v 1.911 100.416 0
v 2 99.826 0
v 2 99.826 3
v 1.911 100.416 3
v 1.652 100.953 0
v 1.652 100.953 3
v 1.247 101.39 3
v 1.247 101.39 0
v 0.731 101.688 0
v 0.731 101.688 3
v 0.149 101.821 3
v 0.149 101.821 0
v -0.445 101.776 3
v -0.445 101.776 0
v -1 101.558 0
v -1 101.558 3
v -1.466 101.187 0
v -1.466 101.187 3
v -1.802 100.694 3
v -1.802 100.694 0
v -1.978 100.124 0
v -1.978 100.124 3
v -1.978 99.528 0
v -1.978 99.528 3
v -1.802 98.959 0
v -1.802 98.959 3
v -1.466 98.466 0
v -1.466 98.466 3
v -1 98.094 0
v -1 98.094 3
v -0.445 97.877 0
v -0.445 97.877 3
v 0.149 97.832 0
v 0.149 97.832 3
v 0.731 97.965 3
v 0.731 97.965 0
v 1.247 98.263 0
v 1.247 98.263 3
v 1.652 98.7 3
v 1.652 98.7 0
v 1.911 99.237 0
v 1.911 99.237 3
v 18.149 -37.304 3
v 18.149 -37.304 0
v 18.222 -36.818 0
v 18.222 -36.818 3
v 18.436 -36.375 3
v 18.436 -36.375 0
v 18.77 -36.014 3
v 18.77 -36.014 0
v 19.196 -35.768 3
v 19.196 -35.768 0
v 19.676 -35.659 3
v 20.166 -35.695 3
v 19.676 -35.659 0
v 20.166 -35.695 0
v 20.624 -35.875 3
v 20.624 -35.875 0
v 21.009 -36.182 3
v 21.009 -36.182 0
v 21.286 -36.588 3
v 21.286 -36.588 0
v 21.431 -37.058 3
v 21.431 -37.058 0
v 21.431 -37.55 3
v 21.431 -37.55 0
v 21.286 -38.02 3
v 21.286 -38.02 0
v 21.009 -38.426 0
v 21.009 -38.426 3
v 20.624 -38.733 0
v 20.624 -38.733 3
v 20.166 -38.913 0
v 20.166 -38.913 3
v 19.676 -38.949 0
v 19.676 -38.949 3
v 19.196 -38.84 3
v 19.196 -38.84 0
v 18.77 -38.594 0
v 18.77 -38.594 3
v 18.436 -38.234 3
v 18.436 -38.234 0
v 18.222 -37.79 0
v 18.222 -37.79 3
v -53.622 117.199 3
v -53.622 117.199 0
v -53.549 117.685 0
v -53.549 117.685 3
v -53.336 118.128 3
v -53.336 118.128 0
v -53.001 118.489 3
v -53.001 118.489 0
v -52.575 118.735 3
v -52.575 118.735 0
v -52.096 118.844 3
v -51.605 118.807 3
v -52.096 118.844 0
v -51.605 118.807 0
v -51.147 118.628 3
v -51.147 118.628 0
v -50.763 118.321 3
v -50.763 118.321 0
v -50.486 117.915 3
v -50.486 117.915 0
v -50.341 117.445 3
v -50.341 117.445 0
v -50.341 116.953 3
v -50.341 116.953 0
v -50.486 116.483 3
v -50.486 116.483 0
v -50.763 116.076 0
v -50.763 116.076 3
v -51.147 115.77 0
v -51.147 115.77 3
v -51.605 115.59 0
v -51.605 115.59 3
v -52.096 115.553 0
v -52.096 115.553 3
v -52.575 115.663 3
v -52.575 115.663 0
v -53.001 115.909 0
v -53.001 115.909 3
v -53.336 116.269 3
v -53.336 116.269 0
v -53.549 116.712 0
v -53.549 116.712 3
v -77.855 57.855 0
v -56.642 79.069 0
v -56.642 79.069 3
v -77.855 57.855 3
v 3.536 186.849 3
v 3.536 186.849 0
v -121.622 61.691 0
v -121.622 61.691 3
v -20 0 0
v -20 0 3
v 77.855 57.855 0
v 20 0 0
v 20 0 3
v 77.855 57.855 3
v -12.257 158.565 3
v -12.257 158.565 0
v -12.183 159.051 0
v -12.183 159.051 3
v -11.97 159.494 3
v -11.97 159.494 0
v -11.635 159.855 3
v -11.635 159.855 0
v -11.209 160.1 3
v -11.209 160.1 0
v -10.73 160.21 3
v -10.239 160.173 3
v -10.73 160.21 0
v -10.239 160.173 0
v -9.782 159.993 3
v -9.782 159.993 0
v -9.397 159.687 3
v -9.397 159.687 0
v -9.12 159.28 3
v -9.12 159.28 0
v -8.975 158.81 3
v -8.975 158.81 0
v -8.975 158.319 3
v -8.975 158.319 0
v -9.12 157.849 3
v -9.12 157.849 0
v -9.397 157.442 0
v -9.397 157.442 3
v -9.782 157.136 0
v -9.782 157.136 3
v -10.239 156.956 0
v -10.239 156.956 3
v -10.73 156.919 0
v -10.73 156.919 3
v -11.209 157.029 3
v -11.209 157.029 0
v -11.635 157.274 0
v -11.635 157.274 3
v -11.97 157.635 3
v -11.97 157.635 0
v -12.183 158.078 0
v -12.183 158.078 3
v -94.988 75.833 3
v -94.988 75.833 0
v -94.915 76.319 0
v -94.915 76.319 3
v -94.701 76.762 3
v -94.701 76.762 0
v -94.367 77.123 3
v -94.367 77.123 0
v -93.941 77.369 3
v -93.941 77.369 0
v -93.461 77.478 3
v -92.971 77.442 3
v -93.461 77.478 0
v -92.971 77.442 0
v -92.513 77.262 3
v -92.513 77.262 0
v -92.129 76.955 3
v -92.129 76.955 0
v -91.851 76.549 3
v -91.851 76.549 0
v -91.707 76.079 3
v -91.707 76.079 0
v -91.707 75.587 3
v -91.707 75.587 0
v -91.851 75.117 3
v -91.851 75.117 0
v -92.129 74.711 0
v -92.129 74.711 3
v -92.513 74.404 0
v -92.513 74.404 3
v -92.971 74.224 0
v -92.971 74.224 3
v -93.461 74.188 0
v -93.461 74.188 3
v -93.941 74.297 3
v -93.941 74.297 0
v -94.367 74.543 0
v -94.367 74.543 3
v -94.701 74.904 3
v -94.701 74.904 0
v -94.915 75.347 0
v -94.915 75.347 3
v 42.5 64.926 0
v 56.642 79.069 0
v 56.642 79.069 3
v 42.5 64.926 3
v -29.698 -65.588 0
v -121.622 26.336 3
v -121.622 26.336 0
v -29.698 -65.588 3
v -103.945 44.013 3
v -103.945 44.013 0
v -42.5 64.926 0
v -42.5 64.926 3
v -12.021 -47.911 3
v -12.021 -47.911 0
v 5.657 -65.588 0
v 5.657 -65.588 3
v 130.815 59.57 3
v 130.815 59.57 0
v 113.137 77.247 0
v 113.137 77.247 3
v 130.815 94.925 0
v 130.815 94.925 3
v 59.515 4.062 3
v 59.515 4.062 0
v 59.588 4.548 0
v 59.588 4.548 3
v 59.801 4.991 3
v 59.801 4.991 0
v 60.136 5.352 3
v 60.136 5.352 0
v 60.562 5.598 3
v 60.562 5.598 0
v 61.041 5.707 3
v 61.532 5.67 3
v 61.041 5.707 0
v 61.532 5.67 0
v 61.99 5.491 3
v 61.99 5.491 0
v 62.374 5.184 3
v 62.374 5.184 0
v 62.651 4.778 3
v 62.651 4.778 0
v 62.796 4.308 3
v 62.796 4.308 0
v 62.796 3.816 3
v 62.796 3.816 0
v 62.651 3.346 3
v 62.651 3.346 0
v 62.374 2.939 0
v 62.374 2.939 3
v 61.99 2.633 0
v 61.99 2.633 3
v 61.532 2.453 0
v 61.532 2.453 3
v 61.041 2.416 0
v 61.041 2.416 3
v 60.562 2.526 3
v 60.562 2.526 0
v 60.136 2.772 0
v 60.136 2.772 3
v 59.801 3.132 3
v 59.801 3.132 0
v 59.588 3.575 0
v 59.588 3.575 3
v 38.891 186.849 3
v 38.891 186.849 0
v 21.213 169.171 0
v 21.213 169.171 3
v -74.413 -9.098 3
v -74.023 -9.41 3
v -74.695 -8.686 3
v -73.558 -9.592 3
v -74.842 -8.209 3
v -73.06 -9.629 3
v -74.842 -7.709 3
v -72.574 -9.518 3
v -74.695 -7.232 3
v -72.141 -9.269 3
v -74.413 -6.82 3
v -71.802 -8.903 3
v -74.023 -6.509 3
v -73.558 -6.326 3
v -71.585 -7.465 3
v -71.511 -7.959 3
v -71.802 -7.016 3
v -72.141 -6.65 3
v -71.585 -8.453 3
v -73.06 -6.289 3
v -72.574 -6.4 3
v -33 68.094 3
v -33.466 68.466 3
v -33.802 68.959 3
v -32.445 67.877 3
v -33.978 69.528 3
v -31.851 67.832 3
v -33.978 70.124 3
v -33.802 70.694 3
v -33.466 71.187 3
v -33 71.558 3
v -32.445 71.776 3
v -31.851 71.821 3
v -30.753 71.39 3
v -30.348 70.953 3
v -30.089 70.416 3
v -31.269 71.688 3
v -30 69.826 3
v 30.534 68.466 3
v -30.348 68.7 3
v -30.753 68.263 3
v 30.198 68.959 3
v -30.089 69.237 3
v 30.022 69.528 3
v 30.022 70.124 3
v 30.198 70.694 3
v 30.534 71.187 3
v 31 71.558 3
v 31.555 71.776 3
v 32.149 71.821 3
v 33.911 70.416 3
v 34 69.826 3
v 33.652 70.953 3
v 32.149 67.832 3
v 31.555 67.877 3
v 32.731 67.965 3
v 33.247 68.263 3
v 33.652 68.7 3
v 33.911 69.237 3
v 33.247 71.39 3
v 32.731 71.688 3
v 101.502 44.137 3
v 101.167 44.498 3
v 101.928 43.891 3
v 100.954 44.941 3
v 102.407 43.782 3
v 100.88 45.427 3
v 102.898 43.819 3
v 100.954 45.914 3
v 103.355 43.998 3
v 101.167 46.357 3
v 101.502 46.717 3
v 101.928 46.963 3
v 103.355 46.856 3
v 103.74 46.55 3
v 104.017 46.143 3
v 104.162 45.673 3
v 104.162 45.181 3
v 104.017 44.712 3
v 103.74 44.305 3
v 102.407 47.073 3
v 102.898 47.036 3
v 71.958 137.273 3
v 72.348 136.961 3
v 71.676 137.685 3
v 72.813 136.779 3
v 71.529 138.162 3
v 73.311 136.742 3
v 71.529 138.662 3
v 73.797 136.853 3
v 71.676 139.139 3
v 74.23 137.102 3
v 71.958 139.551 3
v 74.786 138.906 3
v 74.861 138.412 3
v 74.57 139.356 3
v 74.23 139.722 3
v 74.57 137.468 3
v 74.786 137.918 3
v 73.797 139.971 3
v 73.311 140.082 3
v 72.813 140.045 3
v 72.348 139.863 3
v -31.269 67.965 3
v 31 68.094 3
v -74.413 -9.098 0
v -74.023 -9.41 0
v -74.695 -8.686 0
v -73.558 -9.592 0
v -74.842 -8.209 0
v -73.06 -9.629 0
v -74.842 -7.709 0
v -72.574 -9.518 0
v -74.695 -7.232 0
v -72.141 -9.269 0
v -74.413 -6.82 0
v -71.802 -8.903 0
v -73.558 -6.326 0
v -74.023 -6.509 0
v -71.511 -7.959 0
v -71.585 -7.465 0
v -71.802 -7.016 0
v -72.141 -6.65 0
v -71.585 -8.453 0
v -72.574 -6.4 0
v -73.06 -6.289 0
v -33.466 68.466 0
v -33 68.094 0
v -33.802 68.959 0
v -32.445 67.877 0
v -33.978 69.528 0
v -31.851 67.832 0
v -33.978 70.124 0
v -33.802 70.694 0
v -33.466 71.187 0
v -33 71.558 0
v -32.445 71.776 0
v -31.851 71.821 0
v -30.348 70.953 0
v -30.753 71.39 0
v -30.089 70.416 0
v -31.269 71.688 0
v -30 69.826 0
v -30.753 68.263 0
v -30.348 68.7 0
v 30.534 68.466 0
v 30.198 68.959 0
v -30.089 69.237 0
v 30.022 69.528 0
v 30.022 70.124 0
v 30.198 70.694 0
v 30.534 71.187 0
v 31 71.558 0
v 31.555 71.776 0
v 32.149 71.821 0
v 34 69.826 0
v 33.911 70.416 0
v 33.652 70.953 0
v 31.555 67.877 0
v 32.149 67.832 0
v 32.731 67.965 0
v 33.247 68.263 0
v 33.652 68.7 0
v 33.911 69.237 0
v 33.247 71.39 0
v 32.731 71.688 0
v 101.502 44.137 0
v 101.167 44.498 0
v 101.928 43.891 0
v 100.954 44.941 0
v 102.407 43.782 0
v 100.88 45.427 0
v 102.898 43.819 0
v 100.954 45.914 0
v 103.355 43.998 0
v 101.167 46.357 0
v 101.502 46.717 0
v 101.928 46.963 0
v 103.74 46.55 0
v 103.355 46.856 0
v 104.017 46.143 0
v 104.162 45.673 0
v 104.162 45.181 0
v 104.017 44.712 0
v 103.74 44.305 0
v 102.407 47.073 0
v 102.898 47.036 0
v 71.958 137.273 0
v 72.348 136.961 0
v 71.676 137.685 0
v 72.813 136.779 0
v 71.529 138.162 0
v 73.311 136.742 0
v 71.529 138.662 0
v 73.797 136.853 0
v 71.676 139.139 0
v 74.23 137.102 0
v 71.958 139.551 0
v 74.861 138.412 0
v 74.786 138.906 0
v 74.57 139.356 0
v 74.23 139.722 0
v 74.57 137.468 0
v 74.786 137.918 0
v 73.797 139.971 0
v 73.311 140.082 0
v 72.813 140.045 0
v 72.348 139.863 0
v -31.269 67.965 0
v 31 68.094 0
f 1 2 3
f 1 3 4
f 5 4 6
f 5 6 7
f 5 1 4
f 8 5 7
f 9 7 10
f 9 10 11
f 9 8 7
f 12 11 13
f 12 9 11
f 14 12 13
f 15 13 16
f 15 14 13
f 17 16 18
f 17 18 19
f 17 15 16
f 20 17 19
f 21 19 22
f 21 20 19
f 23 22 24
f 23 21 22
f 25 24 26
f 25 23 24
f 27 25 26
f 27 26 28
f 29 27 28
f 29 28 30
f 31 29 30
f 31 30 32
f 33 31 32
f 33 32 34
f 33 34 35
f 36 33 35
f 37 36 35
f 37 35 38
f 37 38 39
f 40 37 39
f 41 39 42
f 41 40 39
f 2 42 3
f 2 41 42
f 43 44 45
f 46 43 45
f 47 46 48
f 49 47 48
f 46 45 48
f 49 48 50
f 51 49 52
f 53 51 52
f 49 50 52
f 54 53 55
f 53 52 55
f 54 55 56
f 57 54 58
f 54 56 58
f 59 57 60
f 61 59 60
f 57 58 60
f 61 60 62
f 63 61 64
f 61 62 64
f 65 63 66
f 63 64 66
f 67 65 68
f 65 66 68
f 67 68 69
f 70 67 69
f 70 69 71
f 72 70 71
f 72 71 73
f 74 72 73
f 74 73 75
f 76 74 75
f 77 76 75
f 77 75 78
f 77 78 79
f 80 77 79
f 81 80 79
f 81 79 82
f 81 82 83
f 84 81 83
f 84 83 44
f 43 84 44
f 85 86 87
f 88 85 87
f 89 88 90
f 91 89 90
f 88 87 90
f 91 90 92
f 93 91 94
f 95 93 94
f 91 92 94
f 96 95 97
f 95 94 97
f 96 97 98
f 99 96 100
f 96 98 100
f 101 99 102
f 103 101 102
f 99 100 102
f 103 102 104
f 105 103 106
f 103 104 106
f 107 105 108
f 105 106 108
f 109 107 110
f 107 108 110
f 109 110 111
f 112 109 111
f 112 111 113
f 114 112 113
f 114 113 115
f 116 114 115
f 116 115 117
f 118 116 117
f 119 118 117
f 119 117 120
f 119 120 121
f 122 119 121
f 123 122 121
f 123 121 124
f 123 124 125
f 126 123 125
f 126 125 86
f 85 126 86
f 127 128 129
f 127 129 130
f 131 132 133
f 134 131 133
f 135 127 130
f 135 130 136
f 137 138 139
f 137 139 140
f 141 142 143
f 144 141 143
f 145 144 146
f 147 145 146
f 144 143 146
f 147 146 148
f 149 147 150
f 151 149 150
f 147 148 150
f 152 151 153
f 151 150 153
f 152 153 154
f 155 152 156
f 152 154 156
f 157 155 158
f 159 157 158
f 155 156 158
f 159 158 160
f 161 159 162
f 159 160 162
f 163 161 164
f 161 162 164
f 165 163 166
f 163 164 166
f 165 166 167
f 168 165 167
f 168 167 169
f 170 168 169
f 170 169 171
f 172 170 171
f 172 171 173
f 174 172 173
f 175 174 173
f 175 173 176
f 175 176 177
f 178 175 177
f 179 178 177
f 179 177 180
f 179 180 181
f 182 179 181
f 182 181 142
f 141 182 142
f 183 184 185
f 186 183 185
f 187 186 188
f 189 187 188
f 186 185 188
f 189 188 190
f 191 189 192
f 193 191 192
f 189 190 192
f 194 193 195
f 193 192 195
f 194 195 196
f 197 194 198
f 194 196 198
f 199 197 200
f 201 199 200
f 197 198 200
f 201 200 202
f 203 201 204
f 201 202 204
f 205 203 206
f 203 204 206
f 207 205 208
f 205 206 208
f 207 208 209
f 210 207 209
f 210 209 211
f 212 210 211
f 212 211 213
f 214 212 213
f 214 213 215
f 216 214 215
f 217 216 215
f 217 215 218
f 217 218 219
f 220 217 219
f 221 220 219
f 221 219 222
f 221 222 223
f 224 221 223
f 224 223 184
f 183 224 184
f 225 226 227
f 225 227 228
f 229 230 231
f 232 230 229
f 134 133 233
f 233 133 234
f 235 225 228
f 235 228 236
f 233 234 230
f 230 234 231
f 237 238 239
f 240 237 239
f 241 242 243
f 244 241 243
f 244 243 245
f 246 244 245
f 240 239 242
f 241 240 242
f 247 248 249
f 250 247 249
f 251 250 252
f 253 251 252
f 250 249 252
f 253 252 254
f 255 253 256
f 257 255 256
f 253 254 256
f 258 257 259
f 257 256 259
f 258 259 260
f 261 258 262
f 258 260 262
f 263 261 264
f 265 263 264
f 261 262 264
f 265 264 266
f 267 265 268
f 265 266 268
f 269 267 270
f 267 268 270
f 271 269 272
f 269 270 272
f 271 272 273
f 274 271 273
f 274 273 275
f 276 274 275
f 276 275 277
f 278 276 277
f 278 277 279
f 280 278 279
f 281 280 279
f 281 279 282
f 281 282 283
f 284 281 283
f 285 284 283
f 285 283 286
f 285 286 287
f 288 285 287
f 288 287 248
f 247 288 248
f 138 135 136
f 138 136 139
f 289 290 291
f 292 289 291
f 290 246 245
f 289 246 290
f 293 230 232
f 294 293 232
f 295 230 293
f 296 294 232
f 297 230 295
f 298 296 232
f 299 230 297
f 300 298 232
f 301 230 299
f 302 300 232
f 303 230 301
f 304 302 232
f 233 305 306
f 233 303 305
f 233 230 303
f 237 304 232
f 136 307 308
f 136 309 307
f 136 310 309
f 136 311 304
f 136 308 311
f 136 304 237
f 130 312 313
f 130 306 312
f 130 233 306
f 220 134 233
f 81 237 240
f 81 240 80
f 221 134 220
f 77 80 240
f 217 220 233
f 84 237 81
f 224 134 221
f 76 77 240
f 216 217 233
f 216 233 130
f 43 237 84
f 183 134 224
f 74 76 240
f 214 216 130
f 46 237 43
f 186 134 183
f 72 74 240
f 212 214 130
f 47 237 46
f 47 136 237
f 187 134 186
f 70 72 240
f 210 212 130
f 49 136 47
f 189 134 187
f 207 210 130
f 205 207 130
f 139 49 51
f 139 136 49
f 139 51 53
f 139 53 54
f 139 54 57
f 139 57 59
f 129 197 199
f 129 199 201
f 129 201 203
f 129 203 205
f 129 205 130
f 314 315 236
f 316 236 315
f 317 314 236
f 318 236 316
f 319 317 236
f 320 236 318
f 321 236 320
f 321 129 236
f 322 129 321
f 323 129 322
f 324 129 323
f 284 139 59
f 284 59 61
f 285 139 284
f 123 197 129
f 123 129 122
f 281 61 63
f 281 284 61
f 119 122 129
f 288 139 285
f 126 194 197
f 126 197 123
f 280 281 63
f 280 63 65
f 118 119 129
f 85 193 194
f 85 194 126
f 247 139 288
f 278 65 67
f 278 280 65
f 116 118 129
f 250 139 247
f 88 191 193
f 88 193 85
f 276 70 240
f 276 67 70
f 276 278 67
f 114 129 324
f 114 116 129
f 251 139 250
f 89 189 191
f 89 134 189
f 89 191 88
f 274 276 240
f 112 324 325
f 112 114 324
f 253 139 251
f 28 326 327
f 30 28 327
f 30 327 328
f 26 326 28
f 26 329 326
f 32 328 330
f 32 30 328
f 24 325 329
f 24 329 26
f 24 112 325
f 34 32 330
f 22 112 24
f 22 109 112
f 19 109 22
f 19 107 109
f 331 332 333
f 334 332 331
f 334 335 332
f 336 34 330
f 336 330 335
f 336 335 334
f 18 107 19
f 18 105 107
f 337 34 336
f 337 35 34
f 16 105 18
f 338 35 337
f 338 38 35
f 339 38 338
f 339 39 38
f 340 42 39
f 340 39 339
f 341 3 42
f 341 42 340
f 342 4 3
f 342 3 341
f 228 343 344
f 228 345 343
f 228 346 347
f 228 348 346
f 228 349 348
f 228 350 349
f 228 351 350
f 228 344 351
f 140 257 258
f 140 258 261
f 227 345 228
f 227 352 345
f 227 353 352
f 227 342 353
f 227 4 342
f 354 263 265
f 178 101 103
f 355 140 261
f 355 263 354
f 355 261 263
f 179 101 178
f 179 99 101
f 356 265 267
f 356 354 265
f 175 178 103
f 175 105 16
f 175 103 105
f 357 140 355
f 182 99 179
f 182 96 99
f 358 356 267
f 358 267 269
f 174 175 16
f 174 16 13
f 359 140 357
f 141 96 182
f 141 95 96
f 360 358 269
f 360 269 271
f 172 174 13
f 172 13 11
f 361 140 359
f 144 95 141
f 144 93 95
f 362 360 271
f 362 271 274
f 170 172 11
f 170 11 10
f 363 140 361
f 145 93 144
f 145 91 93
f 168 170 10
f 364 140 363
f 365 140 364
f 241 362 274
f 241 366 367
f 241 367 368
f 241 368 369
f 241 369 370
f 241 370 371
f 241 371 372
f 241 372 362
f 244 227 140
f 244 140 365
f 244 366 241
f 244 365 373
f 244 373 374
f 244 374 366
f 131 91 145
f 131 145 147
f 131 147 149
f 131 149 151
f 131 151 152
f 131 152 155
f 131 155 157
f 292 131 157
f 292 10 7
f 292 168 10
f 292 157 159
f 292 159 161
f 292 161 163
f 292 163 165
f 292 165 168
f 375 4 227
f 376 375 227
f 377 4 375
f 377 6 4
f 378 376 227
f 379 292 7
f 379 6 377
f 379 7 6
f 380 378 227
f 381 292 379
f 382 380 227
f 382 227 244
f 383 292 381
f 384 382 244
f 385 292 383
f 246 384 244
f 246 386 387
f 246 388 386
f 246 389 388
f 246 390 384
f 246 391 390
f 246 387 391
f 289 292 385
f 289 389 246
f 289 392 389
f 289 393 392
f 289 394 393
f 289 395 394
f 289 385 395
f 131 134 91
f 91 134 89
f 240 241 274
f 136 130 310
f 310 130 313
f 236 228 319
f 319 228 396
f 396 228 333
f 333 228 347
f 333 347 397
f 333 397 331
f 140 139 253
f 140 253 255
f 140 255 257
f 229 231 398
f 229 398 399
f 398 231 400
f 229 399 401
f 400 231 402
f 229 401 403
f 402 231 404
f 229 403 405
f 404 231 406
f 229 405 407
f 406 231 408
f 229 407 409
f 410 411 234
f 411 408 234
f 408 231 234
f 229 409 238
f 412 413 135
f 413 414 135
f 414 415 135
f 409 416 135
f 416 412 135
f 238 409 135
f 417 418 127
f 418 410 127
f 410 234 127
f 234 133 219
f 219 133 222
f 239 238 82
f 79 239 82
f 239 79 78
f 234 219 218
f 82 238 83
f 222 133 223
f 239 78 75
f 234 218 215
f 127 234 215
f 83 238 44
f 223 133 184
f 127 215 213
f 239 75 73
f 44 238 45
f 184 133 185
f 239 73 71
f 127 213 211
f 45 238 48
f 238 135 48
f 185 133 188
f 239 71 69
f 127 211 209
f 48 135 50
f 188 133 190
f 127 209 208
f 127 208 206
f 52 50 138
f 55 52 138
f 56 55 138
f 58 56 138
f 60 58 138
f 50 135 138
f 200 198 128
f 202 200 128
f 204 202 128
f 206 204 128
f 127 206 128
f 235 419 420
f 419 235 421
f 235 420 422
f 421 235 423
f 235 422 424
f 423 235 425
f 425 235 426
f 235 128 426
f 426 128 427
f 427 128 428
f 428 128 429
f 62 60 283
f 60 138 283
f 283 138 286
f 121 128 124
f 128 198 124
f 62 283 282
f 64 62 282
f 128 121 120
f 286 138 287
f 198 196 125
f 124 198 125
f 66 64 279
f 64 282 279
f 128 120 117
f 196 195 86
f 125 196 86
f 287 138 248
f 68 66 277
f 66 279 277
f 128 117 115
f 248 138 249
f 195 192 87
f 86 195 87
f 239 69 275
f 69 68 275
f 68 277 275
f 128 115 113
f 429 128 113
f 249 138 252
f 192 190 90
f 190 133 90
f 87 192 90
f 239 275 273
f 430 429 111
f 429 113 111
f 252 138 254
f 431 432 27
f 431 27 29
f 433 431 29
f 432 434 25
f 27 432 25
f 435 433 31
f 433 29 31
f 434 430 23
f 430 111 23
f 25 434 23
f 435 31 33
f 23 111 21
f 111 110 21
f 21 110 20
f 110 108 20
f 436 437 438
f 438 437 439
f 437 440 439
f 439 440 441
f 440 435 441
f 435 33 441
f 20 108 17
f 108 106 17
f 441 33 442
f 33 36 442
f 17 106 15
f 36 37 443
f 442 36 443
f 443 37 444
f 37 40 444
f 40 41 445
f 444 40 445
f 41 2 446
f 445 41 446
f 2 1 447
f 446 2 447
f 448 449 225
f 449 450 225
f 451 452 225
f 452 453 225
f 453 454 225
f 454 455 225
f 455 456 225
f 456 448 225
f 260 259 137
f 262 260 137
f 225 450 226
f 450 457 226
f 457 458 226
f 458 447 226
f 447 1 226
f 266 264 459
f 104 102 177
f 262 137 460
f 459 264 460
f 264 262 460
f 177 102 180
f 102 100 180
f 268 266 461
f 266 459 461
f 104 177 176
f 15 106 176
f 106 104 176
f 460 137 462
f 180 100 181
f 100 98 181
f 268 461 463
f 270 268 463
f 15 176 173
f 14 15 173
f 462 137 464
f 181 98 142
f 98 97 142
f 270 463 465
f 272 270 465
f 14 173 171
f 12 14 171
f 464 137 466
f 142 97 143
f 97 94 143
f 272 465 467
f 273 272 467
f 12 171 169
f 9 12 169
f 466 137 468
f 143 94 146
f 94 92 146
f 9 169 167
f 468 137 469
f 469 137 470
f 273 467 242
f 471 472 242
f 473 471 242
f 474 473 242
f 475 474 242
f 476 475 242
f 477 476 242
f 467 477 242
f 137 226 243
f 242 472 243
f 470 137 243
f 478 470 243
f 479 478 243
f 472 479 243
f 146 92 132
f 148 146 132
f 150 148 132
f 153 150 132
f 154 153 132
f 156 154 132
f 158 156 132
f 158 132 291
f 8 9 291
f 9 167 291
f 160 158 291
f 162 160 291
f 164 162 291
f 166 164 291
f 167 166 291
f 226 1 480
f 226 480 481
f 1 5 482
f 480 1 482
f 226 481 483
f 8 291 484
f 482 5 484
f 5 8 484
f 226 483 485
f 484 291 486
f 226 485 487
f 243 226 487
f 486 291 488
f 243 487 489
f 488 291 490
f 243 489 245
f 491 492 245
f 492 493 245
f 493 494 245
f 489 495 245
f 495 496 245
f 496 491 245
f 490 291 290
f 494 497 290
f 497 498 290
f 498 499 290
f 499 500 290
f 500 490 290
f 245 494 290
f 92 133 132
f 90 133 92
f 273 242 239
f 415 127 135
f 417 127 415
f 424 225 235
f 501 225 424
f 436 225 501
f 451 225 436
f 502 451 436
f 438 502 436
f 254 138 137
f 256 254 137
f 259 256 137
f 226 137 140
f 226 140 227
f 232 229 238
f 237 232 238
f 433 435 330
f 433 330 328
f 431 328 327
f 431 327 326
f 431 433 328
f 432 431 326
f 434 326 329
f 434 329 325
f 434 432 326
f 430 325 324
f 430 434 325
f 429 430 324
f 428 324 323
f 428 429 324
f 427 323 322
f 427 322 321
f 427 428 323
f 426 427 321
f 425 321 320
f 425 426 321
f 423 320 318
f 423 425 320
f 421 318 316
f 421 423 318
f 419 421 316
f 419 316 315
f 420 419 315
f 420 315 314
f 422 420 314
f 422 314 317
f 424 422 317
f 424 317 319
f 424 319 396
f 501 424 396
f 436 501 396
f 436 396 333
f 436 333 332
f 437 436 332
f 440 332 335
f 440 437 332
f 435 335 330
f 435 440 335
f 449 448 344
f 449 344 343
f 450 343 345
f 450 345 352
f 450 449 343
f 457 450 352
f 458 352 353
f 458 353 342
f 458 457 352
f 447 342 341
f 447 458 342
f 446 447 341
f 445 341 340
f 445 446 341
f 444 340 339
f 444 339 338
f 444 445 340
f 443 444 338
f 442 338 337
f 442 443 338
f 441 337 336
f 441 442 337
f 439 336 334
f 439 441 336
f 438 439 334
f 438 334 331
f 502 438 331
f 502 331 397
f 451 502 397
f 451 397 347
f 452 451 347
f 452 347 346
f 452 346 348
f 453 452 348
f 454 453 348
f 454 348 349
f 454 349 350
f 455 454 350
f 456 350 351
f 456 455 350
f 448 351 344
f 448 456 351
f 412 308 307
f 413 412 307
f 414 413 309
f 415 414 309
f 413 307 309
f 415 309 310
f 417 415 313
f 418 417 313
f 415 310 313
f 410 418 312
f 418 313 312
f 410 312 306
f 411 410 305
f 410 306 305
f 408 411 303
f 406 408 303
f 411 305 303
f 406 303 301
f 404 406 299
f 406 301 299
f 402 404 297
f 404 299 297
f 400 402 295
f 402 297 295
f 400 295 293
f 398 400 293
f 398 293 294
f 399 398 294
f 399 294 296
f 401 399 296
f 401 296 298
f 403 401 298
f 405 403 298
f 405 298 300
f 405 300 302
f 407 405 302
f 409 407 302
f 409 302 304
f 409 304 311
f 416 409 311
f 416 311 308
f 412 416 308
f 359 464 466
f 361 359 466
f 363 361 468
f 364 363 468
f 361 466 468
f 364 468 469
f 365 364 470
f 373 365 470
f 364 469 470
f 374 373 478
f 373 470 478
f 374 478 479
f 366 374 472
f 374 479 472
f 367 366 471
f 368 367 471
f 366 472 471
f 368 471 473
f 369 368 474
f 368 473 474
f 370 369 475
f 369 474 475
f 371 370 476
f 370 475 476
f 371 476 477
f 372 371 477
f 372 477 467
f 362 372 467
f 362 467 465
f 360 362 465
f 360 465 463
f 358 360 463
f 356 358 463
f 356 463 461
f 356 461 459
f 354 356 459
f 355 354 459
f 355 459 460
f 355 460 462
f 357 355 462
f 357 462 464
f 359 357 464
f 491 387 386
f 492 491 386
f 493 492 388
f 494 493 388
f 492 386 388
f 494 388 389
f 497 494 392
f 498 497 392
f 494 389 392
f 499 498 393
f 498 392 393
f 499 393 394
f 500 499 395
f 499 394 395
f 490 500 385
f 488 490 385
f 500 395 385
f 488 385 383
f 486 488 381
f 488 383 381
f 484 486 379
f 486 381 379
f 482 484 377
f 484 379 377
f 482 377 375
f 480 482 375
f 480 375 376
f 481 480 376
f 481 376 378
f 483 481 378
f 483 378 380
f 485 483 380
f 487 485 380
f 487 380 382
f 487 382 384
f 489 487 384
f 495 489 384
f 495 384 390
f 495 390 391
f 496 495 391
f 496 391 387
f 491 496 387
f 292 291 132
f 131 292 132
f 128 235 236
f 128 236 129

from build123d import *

# Parameters (mm, degrees)
SKETCH_1_R          = 2
EXTRUDE_1_DEPTH     = 3
CUT_EXTRUDE_2_DEPTH = 10
EXTRUDE_2_DEPTH     = 3
SKETCH_6_R          = 1.675
SKETCH_6_R_2        = 1.625
CUT_EXTRUDE_3_DEPTH = 85
SKETCH_7_R          = 1.675
SKETCH_7_R_2        = 1.625
CUT_EXTRUDE_4_DEPTH = 278.005212707
SKETCH_8_R          = 1.65
CUT_EXTRUDE_5_DEPTH = 10


with BuildPart() as part:
    # 草图1 → 凸台-拉伸1 (new body)
    with BuildSketch(Plane.XY):
        Polygon((-160.513239329, 50.913203436), (0, 211.426442765), (160.513239329, 50.913203436), (0, -109.600035894), align=None)
        with Locations((-32, 69.826406871)):
            Circle(SKETCH_1_R, mode=Mode.SUBTRACT)
        with Locations((32, 69.826406871)):
            Circle(SKETCH_1_R, mode=Mode.SUBTRACT)
        with Locations((0, 99.826406871)):
            Circle(SKETCH_1_R, mode=Mode.SUBTRACT)
        Polygon((-20, 0), (20, 0), (77.855339059, 57.855339059), (56.642135624, 79.068542495), (42.5, 64.926406871), (-42.5, 64.926406871), (-56.642135624, 79.068542495), (-77.855339059, 57.855339059), align=None, mode=Mode.SUBTRACT)
    extrude(amount=EXTRUDE_1_DEPTH)

    # 草图4 → 切除-拉伸2 (cut)
    with BuildSketch(Plane.XY.offset(3)):
        Polygon((-160.51323933, 65.226406871), (-160.513239329, 50.913203436), (0, -109.600035894), (160.513239329, 50.913203436), (160.513239329, 65.226406871), (-1e-09, -95.286832458), align=None)
    extrude(amount=-CUT_EXTRUDE_2_DEPTH, mode=Mode.SUBTRACT)

    # 草图5 → 凸台-拉伸2 (add)
    with BuildSketch(Plane.XY.offset(3)):
        Polygon((-1e-09, 225.739646201), (-160.51323933, 65.226406871), (-153.356637612, 58.069805153), (0, 211.426442765), (153.356637611, 58.069805154), (160.513239329, 65.226406871), align=None)
    extrude(amount=-EXTRUDE_2_DEPTH)

    # 草图6 → 切除-拉伸3 (cut)
    with BuildSketch(Plane.XY.offset(3)):
        with Locations((-1e-09, 211.597510577)):
            Circle(SKETCH_6_R)
        with Locations((73.185551852, 138.411958724)):
            Circle(SKETCH_6_R)
        with Locations((146.371103705, 65.226406871)):
            Circle(SKETCH_6_R)
        with Locations((73.185551852, -7.959144981)):
            Circle(SKETCH_6_R)
        with Locations((-1e-09, -81.144696834)):
            Circle(SKETCH_6_R)
        with Locations((-73.185551853, -7.959144981)):
            Circle(SKETCH_6_R)
        with Locations((-146.371103706, 65.226406871)):
            Circle(SKETCH_6_R)
        with Locations((-45.961940778, 165.6355698)):
            Circle(SKETCH_6_R_2)
    extrude(amount=-CUT_EXTRUDE_3_DEPTH, mode=Mode.SUBTRACT)

    # 草图7 → 切除-拉伸4 (cut, through all)
    # profile 1 of 7: a face of its own
    with BuildSketch(Plane(origin=(0, 0, 0), x_dir=(-1, 0, 0), z_dir=(0, 0, -1))):
        Polygon((-3.535533905, 186.848773236), (-21.213203435, 204.526442765), (-38.890872965, 186.848773236), (-21.213203435, 169.171103706), align=None)
    # profile 2 of 7: a face of its own
    with BuildSketch(Plane(origin=(0, 0, 0), x_dir=(-1, 0, 0), z_dir=(0, 0, -1))):
        Polygon((121.622366365, 26.335533906), (139.300035894, 44.013203436), (121.622366365, 61.690872966), (103.944696835, 44.013203436), align=None)
    # profile 3 of 7: a face of its own
    with BuildSketch(Plane(origin=(0, 0, 0), x_dir=(-1, 0, 0), z_dir=(0, 0, -1))):
        Polygon((160.51323933, 65.226406871), (80.256619665, 145.483026536), (59.04341623, 124.269823101), (121.622366365, 61.690872966), (139.300035894, 44.013203436), align=None)
        with Locations((146.371103706, 65.226406871)):
            Circle(SKETCH_7_R, mode=Mode.SUBTRACT)
    # profile 4 of 7: a face of its own
    with BuildSketch(Plane(origin=(0, 0, 0), x_dir=(-1, 0, 0), z_dir=(0, 0, -1))):
        Polygon((80.256619665, 145.483026536), (1e-09, 225.739646201), (-21.213203435, 204.526442765), (-3.535533905, 186.848773236), (59.04341623, 124.269823101), align=None)
        with Locations((45.961940778, 165.6355698)):
            Circle(SKETCH_7_R_2, mode=Mode.SUBTRACT)
        with Locations((1e-09, 211.597510577)):
            Circle(SKETCH_7_R, mode=Mode.SUBTRACT)
    # profile 5 of 7: a face of its own
    with BuildSketch(Plane(origin=(0, 0, 0), x_dir=(-1, 0, 0), z_dir=(0, 0, -1))):
        Polygon((-113.137084989, 77.247222152), (-130.814754519, 94.924891681), (-148.492424049, 77.247222152), (-130.814754519, 59.569552622), align=None)
    # profile 6 of 7: a face of its own
    with BuildSketch(Plane(origin=(0, 0, 0), x_dir=(-1, 0, 0), z_dir=(0, 0, -1))):
        Polygon((-5.656854249, -65.588347648), (-68.235804384, -3.009397513), (-130.814754519, 59.569552622), (-148.492424049, 77.247222152), (-160.513239329, 65.226406871), (1e-09, -95.286832458), (12.020815281, -83.266017178), align=None)
        with Locations((-73.185551852, -7.959144981)):
            Circle(SKETCH_7_R, mode=Mode.SUBTRACT)
        with Locations((1e-09, -81.144696834)):
            Circle(SKETCH_7_R, mode=Mode.SUBTRACT)
        with Locations((-146.371103705, 65.226406871)):
            Circle(SKETCH_7_R, mode=Mode.SUBTRACT)
    # profile 7 of 7: a face of its own
    with BuildSketch(Plane(origin=(0, 0, 0), x_dir=(-1, 0, 0), z_dir=(0, 0, -1))):
        Polygon((12.020815281, -47.910678118), (-5.656854249, -65.588347648), (12.020815281, -83.266017178), (29.69848481, -65.588347648), align=None)
    extrude(amount=-CUT_EXTRUDE_4_DEPTH, mode=Mode.SUBTRACT)

    # 草图8 → 切除-拉伸5 (cut)
    with BuildSketch(Plane(origin=(0, 0, 0), x_dir=(-1, 0, 0), z_dir=(0, 0, -1))):
        with Locations((10.606601718, 158.564501988)):
            Circle(SKETCH_8_R)
        with Locations((51.972348418, 117.198755289)):
            Circle(SKETCH_8_R)
        with Locations((93.338095117, 75.833008589)):
            Circle(SKETCH_8_R)
        with Locations((-102.530483271, 45.427416998)):
            Circle(SKETCH_8_R)
        with Locations((-61.164736572, 4.061670299)):
            Circle(SKETCH_8_R)
        with Locations((-19.798989873, -37.304076401)):
            Circle(SKETCH_8_R)
    extrude(amount=-CUT_EXTRUDE_5_DEPTH, mode=Mode.SUBTRACT)


solid = part.part
